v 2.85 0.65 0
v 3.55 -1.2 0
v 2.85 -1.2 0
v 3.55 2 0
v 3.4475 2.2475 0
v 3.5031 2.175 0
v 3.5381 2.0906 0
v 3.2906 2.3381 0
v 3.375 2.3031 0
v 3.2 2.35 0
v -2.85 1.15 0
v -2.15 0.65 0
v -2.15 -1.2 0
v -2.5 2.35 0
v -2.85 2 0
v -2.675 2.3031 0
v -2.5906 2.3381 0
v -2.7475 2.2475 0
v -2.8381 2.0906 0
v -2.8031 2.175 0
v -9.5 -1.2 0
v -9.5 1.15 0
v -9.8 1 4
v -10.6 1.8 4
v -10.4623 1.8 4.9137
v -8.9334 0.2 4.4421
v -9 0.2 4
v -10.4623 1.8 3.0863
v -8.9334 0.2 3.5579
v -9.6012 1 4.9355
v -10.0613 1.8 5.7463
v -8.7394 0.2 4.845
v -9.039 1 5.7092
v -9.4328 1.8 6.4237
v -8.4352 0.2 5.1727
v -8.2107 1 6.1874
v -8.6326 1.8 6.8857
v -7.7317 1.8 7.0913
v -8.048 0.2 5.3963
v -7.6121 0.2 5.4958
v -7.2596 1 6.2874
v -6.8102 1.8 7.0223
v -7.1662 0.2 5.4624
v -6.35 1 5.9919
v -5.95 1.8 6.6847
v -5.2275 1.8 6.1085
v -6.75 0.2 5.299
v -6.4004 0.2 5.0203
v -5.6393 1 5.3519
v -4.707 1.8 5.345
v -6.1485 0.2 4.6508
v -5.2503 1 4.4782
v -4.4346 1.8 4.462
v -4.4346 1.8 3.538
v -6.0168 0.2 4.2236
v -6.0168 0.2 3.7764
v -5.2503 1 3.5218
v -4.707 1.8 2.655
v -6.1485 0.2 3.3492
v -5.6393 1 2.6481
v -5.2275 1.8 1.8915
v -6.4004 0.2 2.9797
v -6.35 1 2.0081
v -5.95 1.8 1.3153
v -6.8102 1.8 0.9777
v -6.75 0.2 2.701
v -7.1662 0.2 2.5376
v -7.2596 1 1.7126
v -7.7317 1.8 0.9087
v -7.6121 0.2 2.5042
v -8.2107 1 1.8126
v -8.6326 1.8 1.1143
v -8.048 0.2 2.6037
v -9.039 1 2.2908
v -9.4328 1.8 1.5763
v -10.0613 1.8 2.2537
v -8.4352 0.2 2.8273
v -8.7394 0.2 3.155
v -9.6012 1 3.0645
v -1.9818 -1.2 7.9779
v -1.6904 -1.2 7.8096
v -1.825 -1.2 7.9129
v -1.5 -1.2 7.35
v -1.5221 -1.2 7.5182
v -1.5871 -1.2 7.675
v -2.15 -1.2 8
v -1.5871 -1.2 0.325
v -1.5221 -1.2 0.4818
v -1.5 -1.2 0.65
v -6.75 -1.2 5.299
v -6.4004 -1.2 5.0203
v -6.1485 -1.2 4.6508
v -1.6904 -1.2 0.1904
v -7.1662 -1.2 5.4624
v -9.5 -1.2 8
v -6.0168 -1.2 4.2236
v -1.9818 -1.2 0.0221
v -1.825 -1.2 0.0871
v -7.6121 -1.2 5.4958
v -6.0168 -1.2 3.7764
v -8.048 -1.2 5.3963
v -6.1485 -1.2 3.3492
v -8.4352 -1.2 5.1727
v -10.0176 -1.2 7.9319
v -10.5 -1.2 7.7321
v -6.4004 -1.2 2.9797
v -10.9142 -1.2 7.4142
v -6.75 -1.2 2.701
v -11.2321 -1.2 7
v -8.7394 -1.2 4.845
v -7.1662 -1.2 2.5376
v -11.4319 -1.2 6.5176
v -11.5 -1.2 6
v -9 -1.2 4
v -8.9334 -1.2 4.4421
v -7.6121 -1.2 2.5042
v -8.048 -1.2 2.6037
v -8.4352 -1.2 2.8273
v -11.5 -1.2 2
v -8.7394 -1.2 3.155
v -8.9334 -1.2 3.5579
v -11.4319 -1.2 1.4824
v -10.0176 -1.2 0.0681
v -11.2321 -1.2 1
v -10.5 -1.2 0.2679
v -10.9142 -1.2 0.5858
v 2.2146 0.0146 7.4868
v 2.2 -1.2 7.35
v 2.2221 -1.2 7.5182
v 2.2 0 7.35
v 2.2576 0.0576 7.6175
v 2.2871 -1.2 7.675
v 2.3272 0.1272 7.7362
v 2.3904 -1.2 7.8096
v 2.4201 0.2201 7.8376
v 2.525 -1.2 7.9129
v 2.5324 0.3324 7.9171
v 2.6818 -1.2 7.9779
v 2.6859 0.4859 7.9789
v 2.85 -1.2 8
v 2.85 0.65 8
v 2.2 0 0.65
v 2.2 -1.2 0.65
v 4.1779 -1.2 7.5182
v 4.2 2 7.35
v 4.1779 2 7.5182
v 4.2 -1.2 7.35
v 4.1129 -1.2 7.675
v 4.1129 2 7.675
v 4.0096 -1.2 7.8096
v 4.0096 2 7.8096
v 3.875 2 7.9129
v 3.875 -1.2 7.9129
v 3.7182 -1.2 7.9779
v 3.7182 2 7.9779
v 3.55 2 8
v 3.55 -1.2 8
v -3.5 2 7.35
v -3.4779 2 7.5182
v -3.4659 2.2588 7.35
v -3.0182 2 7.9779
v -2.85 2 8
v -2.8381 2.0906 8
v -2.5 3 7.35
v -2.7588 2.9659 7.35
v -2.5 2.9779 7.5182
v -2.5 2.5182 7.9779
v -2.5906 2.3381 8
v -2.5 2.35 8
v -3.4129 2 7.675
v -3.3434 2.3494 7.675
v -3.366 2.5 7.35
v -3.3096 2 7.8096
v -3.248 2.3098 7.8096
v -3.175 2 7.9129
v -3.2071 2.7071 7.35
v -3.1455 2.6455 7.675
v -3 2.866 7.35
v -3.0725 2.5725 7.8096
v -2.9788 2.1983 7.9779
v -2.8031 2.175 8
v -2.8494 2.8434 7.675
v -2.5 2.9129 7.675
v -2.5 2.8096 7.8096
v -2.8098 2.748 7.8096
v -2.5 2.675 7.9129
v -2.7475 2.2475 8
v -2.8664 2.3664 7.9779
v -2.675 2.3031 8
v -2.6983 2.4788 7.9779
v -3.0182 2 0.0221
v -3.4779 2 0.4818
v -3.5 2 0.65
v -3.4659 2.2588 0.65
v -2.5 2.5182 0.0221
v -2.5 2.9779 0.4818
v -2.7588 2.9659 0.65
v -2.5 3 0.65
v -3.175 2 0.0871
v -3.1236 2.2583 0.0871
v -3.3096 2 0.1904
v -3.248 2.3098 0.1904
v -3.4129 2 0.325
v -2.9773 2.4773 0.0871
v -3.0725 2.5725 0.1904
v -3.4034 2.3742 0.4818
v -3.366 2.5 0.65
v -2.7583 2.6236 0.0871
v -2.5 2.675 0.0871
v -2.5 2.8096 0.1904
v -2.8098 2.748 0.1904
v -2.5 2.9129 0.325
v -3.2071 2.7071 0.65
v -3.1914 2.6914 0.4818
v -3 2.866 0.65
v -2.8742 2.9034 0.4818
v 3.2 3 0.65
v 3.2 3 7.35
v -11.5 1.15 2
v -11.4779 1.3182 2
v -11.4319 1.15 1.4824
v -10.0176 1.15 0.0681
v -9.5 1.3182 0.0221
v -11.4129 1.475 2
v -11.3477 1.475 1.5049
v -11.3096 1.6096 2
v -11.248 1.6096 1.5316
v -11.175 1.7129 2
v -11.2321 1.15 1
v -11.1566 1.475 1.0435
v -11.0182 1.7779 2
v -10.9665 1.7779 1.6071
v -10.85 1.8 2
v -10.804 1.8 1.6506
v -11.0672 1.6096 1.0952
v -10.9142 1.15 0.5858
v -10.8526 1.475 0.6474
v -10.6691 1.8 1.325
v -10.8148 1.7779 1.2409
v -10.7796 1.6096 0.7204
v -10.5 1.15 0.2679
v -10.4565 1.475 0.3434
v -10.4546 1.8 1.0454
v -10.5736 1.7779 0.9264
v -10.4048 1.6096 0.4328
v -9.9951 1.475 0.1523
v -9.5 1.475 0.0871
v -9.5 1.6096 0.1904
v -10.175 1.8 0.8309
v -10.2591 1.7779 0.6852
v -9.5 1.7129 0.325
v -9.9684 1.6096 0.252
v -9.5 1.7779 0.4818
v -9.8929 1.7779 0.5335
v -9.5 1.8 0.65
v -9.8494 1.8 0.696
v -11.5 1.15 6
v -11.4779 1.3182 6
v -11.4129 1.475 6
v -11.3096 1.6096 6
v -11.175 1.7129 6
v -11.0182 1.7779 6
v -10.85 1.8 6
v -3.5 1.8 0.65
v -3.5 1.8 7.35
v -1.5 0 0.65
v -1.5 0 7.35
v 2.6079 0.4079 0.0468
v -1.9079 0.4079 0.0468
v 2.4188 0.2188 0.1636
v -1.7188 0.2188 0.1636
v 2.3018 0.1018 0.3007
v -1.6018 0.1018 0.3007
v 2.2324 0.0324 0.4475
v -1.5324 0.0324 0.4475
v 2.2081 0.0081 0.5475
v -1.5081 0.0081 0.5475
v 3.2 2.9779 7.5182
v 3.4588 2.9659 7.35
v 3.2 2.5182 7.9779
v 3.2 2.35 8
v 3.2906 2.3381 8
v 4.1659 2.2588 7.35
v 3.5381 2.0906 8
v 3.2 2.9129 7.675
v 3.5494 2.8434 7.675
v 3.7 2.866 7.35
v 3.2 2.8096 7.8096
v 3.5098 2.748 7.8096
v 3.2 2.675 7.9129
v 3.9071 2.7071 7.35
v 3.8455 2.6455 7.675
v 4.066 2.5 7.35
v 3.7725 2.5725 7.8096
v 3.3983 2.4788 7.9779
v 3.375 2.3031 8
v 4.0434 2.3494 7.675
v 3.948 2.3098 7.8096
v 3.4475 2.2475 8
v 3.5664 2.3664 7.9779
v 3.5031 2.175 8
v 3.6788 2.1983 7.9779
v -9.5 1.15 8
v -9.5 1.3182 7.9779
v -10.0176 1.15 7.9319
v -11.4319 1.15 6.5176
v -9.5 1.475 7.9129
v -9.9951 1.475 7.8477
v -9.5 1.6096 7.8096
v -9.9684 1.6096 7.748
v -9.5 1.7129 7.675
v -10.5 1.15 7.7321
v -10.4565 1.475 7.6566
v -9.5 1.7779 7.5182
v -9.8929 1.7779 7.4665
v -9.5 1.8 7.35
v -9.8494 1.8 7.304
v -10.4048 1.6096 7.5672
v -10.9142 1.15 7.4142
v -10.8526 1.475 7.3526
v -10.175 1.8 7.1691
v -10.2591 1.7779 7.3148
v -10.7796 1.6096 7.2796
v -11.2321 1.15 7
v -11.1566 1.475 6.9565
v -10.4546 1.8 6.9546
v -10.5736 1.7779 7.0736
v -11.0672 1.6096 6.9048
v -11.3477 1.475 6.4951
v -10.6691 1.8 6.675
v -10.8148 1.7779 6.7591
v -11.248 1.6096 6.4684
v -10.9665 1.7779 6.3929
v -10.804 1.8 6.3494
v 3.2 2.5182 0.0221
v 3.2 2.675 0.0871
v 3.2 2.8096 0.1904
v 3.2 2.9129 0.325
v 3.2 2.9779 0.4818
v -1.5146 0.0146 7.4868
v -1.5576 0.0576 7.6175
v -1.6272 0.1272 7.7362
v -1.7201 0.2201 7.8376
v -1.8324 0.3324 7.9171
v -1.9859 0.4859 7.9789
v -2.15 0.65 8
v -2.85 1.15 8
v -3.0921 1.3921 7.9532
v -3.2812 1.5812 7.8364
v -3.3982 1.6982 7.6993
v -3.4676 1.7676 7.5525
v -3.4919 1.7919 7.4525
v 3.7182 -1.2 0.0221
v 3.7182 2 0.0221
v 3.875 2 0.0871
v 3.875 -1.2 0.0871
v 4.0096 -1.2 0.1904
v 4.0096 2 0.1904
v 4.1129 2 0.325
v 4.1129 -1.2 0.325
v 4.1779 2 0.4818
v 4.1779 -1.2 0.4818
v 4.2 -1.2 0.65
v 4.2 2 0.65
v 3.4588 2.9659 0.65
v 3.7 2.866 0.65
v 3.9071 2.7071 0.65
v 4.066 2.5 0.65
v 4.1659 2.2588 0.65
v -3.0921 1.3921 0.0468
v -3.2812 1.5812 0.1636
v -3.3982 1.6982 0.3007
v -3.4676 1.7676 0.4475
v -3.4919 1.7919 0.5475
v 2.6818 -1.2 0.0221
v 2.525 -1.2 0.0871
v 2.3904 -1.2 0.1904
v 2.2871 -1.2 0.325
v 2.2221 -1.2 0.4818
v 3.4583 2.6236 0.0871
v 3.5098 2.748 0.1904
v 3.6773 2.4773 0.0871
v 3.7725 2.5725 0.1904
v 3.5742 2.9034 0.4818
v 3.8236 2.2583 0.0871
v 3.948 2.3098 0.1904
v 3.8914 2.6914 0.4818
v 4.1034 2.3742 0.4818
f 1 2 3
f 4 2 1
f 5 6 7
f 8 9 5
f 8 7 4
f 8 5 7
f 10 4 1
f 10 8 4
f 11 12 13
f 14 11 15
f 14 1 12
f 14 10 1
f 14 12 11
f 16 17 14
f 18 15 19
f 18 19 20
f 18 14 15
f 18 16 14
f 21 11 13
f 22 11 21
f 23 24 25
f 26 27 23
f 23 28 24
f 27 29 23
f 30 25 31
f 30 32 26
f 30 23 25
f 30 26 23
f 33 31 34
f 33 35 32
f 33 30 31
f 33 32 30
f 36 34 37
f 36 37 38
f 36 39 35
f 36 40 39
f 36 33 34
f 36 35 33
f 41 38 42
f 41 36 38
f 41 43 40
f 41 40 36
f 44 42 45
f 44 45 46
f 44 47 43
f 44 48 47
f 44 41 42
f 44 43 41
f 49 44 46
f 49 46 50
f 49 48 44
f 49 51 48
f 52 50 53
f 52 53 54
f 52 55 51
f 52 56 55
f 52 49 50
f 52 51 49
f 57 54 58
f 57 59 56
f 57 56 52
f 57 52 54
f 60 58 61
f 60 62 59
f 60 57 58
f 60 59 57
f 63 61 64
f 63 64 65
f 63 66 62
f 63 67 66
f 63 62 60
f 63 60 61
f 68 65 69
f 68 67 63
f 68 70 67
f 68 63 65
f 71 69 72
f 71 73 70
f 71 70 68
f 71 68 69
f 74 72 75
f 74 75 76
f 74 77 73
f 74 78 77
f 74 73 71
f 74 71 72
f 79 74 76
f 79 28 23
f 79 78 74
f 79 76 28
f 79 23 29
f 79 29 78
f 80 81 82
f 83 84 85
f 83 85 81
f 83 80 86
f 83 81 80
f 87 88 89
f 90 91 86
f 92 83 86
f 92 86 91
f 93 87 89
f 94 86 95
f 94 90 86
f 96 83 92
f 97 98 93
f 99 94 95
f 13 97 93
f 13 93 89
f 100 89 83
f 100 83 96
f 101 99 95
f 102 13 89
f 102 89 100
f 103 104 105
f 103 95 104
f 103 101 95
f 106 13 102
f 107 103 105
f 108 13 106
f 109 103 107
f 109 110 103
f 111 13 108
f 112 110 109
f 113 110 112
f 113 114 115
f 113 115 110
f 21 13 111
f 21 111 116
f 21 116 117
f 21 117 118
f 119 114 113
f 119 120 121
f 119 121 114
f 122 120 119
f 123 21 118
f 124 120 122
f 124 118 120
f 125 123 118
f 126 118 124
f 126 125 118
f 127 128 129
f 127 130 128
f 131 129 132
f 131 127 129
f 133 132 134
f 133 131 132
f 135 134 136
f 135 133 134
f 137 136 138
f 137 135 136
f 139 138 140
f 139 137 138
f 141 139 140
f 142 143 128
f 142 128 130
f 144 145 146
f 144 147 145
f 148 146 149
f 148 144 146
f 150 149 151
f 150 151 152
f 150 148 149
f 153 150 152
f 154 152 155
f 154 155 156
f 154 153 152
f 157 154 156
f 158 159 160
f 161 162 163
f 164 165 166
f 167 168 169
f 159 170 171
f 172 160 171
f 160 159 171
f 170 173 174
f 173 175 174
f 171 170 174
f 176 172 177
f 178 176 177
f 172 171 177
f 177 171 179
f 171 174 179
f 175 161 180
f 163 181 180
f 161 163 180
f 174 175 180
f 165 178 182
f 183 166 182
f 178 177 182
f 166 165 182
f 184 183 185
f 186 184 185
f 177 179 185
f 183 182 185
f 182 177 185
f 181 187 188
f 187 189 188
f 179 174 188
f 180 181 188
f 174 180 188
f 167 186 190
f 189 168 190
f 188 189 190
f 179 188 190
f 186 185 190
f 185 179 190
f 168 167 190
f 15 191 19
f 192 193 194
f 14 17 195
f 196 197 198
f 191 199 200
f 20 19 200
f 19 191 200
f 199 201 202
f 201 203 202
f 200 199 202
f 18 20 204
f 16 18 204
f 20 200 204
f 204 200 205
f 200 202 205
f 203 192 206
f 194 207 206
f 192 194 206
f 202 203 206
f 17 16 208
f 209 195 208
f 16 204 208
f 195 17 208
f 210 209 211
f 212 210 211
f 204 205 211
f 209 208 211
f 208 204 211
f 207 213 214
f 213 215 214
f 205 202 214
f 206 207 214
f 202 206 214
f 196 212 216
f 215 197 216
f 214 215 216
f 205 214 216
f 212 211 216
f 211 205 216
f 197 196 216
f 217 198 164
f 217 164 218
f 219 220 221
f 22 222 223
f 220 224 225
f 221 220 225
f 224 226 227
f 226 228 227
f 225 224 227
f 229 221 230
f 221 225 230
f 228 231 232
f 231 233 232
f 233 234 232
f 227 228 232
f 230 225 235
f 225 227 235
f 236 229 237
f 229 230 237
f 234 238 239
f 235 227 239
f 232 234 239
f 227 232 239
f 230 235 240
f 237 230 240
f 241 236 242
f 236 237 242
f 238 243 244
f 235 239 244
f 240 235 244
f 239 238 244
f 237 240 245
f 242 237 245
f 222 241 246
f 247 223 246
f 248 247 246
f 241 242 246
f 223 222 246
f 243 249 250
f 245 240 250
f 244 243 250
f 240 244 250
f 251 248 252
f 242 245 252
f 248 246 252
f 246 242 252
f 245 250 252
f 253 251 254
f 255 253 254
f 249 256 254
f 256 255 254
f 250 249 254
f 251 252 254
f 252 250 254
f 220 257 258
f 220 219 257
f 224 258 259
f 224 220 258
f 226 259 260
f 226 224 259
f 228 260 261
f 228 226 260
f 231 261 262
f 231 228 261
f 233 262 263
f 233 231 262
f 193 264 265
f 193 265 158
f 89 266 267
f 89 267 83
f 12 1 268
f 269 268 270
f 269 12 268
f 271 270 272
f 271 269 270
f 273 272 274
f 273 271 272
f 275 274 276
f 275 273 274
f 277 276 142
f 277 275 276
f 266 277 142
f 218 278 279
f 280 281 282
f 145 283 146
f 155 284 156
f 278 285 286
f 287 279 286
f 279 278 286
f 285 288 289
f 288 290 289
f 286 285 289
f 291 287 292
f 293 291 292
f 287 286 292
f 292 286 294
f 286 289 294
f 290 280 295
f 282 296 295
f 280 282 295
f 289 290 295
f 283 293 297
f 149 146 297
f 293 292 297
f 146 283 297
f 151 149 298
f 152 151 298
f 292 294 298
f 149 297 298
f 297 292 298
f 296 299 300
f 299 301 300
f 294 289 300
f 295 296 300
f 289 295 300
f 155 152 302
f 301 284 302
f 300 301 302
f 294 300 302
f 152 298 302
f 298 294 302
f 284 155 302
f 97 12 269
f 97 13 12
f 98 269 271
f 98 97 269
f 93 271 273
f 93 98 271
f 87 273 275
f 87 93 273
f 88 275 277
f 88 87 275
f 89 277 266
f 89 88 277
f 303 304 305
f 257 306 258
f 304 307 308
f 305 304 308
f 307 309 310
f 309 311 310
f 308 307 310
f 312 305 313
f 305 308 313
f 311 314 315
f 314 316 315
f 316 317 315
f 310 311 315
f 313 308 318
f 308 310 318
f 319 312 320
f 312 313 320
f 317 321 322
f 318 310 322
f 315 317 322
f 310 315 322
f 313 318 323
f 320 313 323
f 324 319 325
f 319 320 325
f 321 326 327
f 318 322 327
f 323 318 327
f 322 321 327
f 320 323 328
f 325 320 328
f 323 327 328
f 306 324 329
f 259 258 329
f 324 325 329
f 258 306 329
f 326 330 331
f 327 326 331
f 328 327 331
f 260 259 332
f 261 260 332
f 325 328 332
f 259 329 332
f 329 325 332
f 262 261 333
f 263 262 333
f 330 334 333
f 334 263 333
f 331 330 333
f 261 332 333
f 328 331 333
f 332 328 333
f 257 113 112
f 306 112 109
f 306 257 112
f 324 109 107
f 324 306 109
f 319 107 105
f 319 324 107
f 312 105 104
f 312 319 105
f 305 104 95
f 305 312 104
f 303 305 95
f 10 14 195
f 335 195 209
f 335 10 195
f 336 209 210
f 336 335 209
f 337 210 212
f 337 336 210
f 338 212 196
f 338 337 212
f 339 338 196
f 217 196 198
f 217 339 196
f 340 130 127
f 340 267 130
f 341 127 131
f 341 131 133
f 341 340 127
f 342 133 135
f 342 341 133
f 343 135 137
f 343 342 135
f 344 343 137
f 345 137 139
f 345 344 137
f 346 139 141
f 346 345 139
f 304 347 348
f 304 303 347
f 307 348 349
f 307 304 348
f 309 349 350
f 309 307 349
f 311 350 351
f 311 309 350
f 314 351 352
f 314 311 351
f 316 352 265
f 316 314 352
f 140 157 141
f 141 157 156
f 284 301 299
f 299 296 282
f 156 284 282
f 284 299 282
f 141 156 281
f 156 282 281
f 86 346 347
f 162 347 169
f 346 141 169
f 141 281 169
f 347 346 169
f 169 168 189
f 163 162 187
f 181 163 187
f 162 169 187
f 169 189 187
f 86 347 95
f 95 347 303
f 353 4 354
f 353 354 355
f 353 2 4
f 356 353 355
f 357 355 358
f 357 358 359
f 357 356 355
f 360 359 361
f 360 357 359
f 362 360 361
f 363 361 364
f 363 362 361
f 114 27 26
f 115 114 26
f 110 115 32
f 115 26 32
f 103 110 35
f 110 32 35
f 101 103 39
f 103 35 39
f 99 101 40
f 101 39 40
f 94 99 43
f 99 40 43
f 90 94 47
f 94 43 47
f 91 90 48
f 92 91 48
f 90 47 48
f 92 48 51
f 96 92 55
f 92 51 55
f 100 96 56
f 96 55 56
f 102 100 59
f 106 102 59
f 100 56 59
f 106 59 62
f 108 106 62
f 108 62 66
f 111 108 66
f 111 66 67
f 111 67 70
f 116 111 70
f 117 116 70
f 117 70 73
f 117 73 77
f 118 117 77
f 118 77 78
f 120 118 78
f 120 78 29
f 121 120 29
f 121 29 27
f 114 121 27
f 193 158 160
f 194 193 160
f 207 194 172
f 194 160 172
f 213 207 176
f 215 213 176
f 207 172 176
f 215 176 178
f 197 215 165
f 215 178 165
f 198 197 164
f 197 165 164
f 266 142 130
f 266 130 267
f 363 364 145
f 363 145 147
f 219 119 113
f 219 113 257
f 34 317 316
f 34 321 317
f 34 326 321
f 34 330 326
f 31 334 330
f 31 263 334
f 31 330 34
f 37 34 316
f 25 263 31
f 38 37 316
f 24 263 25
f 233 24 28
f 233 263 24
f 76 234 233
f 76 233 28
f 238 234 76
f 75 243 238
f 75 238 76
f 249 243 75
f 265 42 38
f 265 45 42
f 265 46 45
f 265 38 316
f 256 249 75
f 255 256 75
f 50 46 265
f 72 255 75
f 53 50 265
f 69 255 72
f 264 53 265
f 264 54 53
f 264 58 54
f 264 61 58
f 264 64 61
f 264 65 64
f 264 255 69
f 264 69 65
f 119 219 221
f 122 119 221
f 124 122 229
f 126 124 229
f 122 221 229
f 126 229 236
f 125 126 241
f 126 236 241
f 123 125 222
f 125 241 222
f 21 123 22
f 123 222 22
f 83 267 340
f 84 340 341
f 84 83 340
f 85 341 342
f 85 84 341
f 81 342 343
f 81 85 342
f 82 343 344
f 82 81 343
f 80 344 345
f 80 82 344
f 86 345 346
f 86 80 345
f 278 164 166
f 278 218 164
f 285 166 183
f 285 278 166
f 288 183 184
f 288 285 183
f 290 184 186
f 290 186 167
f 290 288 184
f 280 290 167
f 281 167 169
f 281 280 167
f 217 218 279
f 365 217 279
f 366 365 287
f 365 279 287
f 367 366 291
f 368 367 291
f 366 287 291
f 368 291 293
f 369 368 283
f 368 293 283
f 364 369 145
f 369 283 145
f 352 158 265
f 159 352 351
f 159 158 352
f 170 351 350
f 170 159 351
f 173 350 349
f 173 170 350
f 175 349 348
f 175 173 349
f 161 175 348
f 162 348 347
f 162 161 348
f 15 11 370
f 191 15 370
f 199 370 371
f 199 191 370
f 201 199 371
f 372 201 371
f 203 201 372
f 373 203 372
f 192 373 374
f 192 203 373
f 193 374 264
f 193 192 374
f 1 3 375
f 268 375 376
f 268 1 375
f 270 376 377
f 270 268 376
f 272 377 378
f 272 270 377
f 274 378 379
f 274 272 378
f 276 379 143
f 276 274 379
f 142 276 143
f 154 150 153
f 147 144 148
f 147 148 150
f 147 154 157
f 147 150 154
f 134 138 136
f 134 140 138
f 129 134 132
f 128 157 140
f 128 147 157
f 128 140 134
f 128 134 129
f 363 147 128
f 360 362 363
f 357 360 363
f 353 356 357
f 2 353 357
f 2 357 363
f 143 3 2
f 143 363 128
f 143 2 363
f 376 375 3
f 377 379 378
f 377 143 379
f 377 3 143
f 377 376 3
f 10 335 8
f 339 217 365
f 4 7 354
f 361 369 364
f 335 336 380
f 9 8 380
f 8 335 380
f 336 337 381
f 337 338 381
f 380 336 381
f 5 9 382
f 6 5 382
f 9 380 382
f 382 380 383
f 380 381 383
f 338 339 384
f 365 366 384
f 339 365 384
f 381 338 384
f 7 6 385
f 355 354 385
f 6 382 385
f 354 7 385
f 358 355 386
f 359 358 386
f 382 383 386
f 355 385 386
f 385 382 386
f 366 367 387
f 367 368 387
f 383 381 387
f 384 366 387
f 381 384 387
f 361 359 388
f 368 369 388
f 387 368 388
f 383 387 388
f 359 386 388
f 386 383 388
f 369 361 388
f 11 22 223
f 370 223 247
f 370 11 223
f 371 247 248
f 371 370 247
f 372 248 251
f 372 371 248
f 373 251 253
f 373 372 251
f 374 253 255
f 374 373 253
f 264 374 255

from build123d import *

# Parameters (mm, degrees)
RESSALTO_EXTRUS_O1_DEPTH = 8
ESBO_O2_R                = 1.5
CORTE_EXTRUS_O1_DEPTH    = 6
CHANFRO2_SIZE            = 1.6
FILETE3_R                = 2
FILETE5_R                = 1
FILETE6_R                = 0.65


with BuildPart() as part:
    # Esboço1 → Ressalto-extrusão1 (new body)
    with BuildSketch(Plane.XY):
        Polygon((-11.5, -1.2), (-11.5, 1.8), (-3.5, 1.8), (-3.5, 3), (4.2, 3), (4.2, -1.2), (2.2, -1.2), (2.2, 0), (-1.5, 0), (-1.5, -1.2), align=None)
    extrude(amount=RESSALTO_EXTRUS_O1_DEPTH)

    # Esboço2 → Corte-extrusão1 (cut)
    with BuildSketch(Plane(origin=(0, 1.8, 0), x_dir=(1, 0, 0), z_dir=(0, 1, 0))):
        with Locations(Location((-7.5, -4, 0), (0, 0, 180))):
            Circle(ESBO_O2_R)
    extrude(amount=-CORTE_EXTRUS_O1_DEPTH, mode=Mode.SUBTRACT)

    # Chanfro2
    chanfro2_edges = [part.edges().sort_by_distance(p)[0] for p in [
        (-6, 1.8, 4),
    ]]
    chamfer(chanfro2_edges, length=CHANFRO2_SIZE)

    # Filete3
    filete3_edges = [part.edges().sort_by_distance(p)[0] for p in [
        (-11.5, 0.3, 0),
        (-11.5, 0.3, 8),
    ]]
    fillet(filete3_edges, radius=FILETE3_R)

    # Filete5
    filete5_edges = [part.edges().sort_by_distance(p)[0] for p in [
        (-3.5, 3, 4),
        (4.2, 3, 4),
    ]]
    fillet(filete5_edges, radius=FILETE5_R)

    # Filete6
    filete6_edges = [part.edges().sort_by_distance(p)[0] for p in [
        (-1.5, -0.6, 0),
        (-6.5, 1.8, 0),
        (4.2, 0.4, 0),
        (2.2, -0.6, 0),
        (0.35, 0, 0),
        (4.2, 0.4, 8),
        (-6.5, 1.8, 8),
        (-1.5, -0.6, 8),
        (-11.5, 1.8, 4),
        (-10.914213562, 1.8, 0.585786438),
        (-10.914213562, 1.8, 7.414213562),
        (0.35, 0, 8),
        (-3.5, 1.9, 0),
        (-3.5, 1.9, 8),
        (0.35, 3, 0),
        (3.907106781, 2.707106781, 0),
        (-3.207106781, 2.707106781, 0),
        (0.35, 3, 8),
        (3.907106781, 2.707106781, 8),
        (-3.207106781, 2.707106781, 8),
        (2.2, -0.6, 8),
    ]]
    fillet(filete6_edges, radius=FILETE6_R)


solid = part.part
